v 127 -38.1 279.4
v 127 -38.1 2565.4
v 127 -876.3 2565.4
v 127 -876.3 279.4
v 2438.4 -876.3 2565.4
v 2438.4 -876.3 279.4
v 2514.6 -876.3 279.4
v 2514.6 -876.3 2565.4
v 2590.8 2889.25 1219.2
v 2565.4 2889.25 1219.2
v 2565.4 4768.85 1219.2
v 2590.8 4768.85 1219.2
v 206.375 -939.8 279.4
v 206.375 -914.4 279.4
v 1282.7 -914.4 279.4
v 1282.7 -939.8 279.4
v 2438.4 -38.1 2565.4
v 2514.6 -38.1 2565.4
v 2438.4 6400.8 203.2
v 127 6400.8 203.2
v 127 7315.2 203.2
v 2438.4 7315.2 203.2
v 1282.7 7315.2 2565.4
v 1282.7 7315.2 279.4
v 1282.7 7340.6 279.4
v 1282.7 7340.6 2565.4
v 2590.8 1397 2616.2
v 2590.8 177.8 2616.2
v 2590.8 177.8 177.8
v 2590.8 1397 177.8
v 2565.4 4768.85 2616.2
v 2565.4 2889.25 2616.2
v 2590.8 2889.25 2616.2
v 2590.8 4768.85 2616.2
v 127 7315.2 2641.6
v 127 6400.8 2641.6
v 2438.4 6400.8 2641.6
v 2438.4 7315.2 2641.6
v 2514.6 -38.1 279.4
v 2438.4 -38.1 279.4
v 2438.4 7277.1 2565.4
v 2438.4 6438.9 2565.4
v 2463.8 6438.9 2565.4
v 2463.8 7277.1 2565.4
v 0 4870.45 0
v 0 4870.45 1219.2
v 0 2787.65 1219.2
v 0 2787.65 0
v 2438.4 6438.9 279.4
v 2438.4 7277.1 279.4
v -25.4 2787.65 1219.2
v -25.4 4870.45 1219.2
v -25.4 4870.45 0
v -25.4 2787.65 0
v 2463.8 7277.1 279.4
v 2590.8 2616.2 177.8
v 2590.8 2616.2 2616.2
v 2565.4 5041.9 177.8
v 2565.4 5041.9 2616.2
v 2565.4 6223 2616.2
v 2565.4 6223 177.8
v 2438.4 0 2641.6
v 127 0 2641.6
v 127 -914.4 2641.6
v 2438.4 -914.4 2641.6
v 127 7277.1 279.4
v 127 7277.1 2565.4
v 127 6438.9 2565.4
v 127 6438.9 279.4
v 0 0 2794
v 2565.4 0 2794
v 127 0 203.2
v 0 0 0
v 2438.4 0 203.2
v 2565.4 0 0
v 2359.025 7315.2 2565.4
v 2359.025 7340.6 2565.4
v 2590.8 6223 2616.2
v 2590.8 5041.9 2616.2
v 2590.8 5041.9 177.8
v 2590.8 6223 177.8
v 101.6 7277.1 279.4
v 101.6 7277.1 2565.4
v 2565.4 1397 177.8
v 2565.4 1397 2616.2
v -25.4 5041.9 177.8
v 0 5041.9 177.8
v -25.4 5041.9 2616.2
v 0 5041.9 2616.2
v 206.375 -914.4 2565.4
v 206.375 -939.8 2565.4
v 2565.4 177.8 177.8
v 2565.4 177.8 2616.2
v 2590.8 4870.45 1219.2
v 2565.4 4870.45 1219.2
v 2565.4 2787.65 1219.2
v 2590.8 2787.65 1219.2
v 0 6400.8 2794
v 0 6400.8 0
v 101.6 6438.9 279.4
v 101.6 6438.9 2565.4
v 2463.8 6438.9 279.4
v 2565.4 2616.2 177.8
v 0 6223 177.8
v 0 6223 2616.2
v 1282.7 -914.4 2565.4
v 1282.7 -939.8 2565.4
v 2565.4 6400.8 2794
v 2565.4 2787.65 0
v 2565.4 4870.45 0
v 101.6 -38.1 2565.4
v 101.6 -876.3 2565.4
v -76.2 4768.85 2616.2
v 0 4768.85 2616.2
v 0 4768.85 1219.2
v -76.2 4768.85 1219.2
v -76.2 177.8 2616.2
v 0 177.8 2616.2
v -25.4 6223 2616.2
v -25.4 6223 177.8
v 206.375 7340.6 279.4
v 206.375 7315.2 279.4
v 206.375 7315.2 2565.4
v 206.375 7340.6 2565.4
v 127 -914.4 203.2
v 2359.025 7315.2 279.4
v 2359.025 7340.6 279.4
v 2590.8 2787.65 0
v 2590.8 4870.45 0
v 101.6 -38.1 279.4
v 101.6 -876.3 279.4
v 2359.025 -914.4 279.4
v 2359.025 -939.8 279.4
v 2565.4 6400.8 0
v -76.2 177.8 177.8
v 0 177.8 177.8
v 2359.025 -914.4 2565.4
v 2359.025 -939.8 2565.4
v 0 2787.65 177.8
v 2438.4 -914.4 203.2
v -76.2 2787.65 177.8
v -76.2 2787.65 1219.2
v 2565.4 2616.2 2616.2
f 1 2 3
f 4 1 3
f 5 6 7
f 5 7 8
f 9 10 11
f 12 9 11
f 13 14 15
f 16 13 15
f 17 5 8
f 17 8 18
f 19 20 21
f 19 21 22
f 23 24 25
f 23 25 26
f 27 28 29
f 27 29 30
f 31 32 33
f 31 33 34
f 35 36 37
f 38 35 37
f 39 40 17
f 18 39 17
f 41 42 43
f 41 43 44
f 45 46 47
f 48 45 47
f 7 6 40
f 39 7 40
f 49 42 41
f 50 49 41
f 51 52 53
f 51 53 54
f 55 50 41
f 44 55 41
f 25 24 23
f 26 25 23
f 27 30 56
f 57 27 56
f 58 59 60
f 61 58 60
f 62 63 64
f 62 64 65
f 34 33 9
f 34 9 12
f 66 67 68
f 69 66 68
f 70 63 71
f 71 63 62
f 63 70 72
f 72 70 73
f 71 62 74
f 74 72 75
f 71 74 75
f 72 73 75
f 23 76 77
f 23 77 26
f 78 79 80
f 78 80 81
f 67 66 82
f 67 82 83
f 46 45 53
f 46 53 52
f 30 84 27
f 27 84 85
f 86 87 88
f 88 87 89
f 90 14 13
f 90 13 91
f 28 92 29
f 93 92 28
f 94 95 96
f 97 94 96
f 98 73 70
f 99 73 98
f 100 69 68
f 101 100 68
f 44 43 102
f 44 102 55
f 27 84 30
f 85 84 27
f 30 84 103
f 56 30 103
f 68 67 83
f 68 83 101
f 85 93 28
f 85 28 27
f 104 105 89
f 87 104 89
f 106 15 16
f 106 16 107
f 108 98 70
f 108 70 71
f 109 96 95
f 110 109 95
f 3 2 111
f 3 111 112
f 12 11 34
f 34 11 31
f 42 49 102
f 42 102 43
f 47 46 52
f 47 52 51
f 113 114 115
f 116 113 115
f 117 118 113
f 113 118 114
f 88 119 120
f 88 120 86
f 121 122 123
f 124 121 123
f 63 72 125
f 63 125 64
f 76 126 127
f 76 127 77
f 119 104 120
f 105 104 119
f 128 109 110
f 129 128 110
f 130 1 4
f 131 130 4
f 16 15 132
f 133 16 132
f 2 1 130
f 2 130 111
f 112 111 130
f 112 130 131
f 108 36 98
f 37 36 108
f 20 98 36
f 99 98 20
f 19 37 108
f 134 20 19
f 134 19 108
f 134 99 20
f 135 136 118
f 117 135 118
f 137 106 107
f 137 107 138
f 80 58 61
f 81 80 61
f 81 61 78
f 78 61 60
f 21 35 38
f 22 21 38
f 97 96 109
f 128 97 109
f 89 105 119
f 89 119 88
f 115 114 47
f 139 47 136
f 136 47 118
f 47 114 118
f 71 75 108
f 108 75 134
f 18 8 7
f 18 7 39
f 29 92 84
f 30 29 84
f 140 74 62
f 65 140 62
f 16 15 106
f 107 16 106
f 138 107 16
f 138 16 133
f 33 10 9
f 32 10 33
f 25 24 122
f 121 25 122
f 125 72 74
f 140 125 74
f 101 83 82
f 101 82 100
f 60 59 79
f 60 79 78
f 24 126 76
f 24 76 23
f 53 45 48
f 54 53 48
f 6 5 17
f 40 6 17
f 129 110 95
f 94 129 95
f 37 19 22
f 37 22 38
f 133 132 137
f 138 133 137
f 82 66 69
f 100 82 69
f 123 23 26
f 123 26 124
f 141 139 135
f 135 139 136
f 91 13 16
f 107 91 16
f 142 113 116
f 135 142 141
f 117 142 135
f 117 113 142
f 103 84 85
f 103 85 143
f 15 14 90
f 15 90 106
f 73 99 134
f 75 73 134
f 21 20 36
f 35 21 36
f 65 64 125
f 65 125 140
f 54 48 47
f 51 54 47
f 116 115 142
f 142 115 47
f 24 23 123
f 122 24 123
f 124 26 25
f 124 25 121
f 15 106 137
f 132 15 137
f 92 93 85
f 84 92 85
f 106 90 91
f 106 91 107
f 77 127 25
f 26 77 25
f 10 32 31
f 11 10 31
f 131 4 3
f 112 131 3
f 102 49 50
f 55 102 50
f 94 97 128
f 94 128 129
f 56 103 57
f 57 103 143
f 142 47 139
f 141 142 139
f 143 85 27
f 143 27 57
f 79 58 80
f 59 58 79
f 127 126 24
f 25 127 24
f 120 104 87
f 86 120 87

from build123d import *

# Parameters (mm, degrees)
F0_W          = 2565.4
F0_H          = 6400.8
F1_DEPTH      = 2794
F2_W          = 2311.4
F2_H          = 2438.4
F3_DEPTH      = 914.4
F3_DEPTH_BACK = 7315.2
F8_W          = 838.2
F8_H          = 2286
F7_W          = 1181.1
F7_H          = 2438.4
F7_W_2        = 2082.8
F7_H_2        = 1219.2
F13_DEPTH     = 25.4
F5_W          = 1076.325
F5_H          = 2286
F14_DEPTH     = 25.4
F15_DEPTH     = 25.4
F6_W          = 1879.6
F6_H          = 1397
F6_W_2        = 1219.2
F6_H_2        = 2438.4
F16_DEPTH     = 25.4
F10_W         = 838.2
F10_H         = 2286
F6_W_3        = 1181.1
F17_DEPTH     = 25.4
F18_DEPTH     = 76.2
F12_W         = 838.2
F12_H         = 2286
F19_DEPTH     = 76.2
F4_W          = 1076.325
F4_H          = 2286
F20_DEPTH     = 25.4
F21_DEPTH     = 25.4
F9_W          = 838.2
F9_H          = 2286
F22_DEPTH     = 25.4


with BuildPart() as f1:
    # F0 (on Top) → F1 (new body)
    with BuildSketch(Plane.XY):
        with Locations((1282.7, 3200.4)):
            Rectangle(F0_W, F0_H)
    extrude(amount=F1_DEPTH)

    # F2 (on face) → F3 (join, two sides)
    with BuildSketch(Plane.XZ) as f3_sk:
        with Locations((1282.7, 1422.4)):
            Rectangle(F2_W, F2_H)
    extrude(amount=F3_DEPTH)
    extrude(f3_sk.sketch, amount=-F3_DEPTH_BACK)


with BuildPart() as f13:
    # F8 (on face) + F7 (on face) → F13 (new body)
    with BuildSketch(Plane(origin=(127, 0, 0), x_dir=(0, -1, 0), z_dir=(-1, 0, 0))):
        with Locations((-6858, 1422.4)):
            Rectangle(F8_W, F8_H)
    with BuildSketch(Plane(origin=(0, 0, 0), x_dir=(0, -1, 0), z_dir=(-1, 0, 0))):
        with Locations((-5632.45, 1397)):
            Rectangle(F7_W, F7_H)
        with Locations((-3829.05, 609.6)):
            Rectangle(F7_W_2, F7_H_2)
    extrude(amount=F13_DEPTH)


with BuildPart() as f14:
    # F5 (on face) → F14 (new body)
    with BuildSketch(Plane(origin=(0, 7315.2, 0), x_dir=(-1, 0, 0), z_dir=(0, 1, 0))):
        with Locations((-744.5375, 1422.4)):
            Rectangle(F5_W, F5_H)
    extrude(amount=F14_DEPTH)


with BuildPart() as f15:
    # F5 (on face) → F15 (new body)
    with BuildSketch(Plane(origin=(0, 7315.2, 0), x_dir=(-1, 0, 0), z_dir=(0, 1, 0))):
        with Locations((-1820.8625, 1422.4)):
            Rectangle(F5_W, F5_H)
    extrude(amount=F15_DEPTH)


with BuildPart() as f16:
    # F6 (on face) → F16 (new body)
    with BuildSketch(Plane.YZ.offset(2565.4)):
        with Locations((3829.05, 1917.7)):
            Rectangle(F6_W, F6_H)
        with Locations((2006.6, 1397)):
            Rectangle(F6_W_2, F6_H_2)
    extrude(amount=F16_DEPTH)


with BuildPart() as f17:
    # F10 (on face) + F6 (on face) → F17 (new body)
    with BuildSketch(Plane.YZ.offset(2438.4)):
        with Locations((6858, 1422.4)):
            Rectangle(F10_W, F10_H)
    with BuildSketch(Plane.YZ.offset(2565.4)):
        with Locations((5632.45, 1397)):
            Rectangle(F6_W_3, F6_H_2)
        Polygon((2787.65, 1219.2), (2787.65, 0), (4870.45, 0), (4870.45, 1219.2), (4768.85, 1219.2), (2889.25, 1219.2), align=None)
        with Locations((787.4, 1397)):
            Rectangle(F6_W_2, F6_H_2)
    extrude(amount=F17_DEPTH)


with BuildPart() as f18:
    # F11 (on face) → F18 (new body)
    with BuildSketch(Plane(origin=(0, 0, 0), x_dir=(0, -1, 0), z_dir=(-1, 0, 0))):
        Polygon((-4768.85, 2616.2), (-4768.85, 1219.2), (-2787.65, 1219.2), (-2787.65, 177.8), (-177.8, 177.8), (-177.8, 2616.2), align=None)
    extrude(amount=F18_DEPTH)


with BuildPart() as f19:
    # F12 (on face) → F19 (new body)
    with BuildSketch(Plane.YZ.offset(2438.4)):
        with Locations((-457.2, 1422.4)):
            Rectangle(F12_W, F12_H)
    extrude(amount=F19_DEPTH)


with BuildPart() as f20:
    # F4 (on face) → F20 (new body)
    with BuildSketch(Plane.XZ.offset(914.4)):
        with Locations((1820.8625, 1422.4)):
            Rectangle(F4_W, F4_H)
    extrude(amount=F20_DEPTH)


with BuildPart() as f21:
    # F4 (on face) → F21 (new body)
    with BuildSketch(Plane.XZ.offset(914.4)):
        with Locations((744.5375, 1422.4)):
            Rectangle(F4_W, F4_H)
    extrude(amount=F21_DEPTH)


with BuildPart() as f22:
    # F9 (on face) → F22 (new body)
    with BuildSketch(Plane(origin=(127, 0, 0), x_dir=(0, -1, 0), z_dir=(-1, 0, 0))):
        with Locations((457.2, 1422.4)):
            Rectangle(F9_W, F9_H)
    extrude(amount=F22_DEPTH)


solid = Compound([f1.part, f13.part, f14.part, f15.part, f16.part, f17.part, f18.part, f19.part, f20.part, f21.part, f22.part])
